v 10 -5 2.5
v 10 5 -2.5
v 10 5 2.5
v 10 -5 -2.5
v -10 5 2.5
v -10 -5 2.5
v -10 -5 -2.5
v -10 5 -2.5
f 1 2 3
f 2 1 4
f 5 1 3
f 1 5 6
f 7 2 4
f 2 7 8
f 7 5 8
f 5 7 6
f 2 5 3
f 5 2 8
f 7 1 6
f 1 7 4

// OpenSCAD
$fn=99;



/*color("blue")
minkowski() {
     cube([20,10,5], center=true);
    cylinder(r=5, h=5, center=true);
}*/

module mcc(x,y,z,rr) {
    minkowski() {
        cube([x-2*rr,y-2*rr,z/2], center=true);
        cylinder(r=rr, h=z/2, center=true);
    }
}


r = 5;
x = 20;
y = 10;
z = 5;

color("red") cube([x,y,z], center=true);
color("blue") mcc(x,y,z,r);
